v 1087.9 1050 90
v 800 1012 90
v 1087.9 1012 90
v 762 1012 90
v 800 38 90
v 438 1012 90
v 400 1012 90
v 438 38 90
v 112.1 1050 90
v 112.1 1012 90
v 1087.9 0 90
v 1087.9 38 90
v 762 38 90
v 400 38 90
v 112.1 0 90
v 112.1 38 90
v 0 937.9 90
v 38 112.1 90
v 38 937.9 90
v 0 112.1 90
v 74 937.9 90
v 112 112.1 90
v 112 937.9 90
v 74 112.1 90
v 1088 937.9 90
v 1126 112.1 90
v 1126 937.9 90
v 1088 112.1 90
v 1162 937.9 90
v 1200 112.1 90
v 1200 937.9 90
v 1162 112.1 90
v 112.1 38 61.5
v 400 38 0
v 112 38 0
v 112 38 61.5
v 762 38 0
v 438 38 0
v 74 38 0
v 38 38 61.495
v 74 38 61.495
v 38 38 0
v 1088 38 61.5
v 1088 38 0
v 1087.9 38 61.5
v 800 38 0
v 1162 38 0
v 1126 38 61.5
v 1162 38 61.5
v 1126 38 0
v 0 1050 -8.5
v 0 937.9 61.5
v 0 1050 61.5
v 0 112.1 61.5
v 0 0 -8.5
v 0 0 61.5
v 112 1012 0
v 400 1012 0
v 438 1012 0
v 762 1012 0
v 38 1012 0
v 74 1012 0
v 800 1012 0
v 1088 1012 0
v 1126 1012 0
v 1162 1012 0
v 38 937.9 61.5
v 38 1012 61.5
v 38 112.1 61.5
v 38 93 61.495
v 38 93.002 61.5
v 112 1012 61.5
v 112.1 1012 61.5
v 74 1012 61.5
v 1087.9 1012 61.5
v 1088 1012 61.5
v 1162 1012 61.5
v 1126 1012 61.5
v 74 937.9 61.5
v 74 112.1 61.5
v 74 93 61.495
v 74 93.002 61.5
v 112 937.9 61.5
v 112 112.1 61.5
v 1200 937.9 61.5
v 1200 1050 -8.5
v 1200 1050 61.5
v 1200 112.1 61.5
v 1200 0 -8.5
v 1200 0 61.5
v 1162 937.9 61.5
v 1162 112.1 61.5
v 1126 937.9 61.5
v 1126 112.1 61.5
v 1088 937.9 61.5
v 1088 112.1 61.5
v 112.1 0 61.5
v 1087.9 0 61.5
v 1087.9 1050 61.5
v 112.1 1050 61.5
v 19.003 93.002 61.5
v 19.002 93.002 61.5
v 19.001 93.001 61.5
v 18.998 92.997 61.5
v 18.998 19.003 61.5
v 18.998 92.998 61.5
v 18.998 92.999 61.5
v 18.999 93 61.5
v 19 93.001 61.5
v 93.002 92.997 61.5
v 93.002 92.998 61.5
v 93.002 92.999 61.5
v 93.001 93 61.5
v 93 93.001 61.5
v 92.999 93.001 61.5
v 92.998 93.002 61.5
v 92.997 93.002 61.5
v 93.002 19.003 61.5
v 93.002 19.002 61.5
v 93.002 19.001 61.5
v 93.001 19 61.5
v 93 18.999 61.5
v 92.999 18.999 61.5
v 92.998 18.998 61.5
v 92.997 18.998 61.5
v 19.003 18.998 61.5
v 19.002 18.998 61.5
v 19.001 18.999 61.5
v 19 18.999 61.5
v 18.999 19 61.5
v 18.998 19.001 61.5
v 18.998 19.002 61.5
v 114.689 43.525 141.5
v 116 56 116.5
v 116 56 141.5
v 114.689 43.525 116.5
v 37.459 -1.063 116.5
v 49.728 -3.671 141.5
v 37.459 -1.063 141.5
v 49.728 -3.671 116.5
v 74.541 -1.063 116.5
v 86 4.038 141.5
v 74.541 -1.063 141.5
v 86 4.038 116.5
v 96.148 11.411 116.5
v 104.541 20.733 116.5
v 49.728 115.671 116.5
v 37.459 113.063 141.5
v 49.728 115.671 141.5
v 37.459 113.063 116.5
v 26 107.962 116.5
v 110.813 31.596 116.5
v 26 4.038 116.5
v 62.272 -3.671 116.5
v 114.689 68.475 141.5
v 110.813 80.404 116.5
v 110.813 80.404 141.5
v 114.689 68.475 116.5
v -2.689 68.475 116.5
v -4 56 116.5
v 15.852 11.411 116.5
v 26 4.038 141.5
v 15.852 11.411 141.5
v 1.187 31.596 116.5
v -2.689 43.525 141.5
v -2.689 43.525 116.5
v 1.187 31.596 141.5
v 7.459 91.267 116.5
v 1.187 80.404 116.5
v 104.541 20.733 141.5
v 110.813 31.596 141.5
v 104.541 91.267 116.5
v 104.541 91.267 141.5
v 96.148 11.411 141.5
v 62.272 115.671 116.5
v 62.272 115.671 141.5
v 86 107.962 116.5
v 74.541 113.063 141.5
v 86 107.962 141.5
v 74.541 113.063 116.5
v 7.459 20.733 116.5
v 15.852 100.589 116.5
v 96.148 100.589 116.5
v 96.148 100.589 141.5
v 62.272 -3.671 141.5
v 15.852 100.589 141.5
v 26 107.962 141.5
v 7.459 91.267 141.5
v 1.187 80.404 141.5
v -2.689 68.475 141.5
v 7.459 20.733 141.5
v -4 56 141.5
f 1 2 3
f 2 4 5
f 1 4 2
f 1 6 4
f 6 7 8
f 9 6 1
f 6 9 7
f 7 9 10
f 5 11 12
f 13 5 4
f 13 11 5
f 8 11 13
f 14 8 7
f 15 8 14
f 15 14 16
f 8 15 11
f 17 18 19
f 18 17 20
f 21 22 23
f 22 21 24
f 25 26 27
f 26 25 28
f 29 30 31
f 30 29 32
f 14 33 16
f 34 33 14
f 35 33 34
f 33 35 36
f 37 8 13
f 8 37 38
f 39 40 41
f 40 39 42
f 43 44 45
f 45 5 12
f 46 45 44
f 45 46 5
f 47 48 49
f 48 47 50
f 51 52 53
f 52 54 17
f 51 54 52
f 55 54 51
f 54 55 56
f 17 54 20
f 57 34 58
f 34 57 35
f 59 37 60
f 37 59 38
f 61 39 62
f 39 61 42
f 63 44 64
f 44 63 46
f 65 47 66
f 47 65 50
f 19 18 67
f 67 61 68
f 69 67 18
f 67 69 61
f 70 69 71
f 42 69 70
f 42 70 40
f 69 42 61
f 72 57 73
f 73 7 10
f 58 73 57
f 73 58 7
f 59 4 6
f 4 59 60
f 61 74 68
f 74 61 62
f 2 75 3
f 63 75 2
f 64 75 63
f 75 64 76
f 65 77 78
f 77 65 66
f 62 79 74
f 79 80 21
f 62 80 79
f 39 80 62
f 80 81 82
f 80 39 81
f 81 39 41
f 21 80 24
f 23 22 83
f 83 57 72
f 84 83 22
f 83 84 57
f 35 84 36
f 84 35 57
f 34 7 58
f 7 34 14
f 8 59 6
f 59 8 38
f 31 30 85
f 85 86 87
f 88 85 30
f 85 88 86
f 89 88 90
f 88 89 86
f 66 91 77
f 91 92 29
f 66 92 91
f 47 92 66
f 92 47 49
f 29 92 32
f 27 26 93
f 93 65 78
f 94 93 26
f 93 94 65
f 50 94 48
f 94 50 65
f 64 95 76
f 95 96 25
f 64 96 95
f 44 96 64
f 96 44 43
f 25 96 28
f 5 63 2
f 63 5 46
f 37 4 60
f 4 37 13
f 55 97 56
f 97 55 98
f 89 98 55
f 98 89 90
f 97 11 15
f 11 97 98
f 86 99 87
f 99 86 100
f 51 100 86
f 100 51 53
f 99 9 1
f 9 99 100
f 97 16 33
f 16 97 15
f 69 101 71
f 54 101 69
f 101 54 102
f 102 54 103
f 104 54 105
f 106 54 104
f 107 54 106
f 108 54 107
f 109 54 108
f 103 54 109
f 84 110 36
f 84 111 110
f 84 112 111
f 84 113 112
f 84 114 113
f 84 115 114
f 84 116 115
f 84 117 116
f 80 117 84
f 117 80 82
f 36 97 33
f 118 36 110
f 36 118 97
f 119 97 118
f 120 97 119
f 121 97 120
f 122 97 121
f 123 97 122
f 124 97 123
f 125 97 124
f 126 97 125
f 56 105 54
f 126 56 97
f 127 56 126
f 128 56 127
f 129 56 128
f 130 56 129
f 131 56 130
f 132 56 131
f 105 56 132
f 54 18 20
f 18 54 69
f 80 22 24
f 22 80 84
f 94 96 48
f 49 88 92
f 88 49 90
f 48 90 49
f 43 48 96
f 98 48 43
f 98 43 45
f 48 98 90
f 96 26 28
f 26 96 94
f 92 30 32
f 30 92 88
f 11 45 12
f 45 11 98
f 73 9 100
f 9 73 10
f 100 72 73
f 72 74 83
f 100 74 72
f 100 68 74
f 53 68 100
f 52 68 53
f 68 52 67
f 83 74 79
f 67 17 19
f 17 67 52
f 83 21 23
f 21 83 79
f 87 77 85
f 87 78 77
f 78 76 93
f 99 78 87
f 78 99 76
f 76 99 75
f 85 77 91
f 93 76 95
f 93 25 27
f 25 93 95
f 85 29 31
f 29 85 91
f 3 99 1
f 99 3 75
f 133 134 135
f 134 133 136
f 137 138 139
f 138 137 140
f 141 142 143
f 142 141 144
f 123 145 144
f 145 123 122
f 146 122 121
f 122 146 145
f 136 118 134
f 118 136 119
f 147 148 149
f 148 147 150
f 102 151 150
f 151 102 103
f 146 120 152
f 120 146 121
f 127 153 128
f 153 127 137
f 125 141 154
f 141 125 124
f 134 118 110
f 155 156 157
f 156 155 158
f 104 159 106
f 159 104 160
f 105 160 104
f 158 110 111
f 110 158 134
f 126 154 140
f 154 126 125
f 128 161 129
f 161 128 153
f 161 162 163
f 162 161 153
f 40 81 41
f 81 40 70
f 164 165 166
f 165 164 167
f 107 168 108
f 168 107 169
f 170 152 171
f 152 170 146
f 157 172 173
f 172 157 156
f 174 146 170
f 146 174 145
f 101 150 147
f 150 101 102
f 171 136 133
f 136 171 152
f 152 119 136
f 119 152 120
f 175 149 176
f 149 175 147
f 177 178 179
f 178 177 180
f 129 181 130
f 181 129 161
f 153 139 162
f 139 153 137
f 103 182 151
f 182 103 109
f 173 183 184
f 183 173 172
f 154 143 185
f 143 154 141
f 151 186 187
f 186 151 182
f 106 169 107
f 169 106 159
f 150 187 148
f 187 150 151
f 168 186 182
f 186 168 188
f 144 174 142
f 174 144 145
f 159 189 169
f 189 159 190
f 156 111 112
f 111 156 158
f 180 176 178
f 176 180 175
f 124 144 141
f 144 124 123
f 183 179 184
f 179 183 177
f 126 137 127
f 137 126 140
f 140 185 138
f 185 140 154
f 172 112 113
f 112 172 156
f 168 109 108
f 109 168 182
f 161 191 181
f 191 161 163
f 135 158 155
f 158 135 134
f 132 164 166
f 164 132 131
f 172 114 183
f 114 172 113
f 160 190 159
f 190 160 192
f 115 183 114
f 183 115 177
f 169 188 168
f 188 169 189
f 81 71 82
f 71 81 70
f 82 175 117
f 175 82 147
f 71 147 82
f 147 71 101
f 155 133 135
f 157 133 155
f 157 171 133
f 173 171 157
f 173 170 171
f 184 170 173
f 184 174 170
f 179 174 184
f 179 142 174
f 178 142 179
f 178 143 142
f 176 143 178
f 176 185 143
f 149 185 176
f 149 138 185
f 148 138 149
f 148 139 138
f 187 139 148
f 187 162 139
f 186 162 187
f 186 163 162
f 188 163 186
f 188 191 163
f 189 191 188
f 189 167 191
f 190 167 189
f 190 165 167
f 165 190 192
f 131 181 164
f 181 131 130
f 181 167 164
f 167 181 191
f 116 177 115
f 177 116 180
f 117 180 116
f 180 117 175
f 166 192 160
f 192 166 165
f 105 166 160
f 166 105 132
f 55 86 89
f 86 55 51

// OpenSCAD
one=19;
two=38;
four=90;

pad=0.1;
zero=0.01;

// from amazon listing:
// 41.3 x 47.2 x 74.8 inches 
in=25.4;
// packing wood with sauna
base_wood=8.5;

base_x=1200;
base_y=1050;

max_height=150;

wheelbase=74;
wheel_diameter=120;
wheel_height=80;
wheel_bump=25;

wood_flat_height=max_height-base_wood-wheel_height;
wheel_offset=wheelbase/2+two/2;
wood_flat_wide=wheelbase+two+pad*2;

module wheel() {
    hull() {
        translate([0,0,wheel_height-wheel_bump])
        cylinder(d=wheel_diameter,h=wheel_bump);
        cube([wheelbase,wheelbase,zero],center=true);
    }
}

translate([wheel_offset,wheel_offset,max_height-base_wood-wheel_height])
wheel();

module twobyfour(length) {
    cube([length,two,four]);
}

translate([0,0,-base_wood]){
    color("tan")
    linear_extrude(height=base_wood)
    square([base_x,base_y]);
    //#cube([base_x,base_y,max_height]);
}

module dirror_y(y=0) {
    children();
    translate([0,y])
    mirror([0,1])
    children();
}


module dirror_x(x=0) {
    children();
    translate([x,0])
    mirror([1,0])
    children();
}

//#cube([base_x,base_y,max_height]);


module beam_x(y=0) {
    color("lime")
    translate([0,y])
    twobyfour(base_x);
}

module beam_y(x=0) {
    color("blue")
    translate([x+two,two])
    rotate([0,0,90])
    twobyfour(base_y-two*2);
}

module beams() {
    beam_x();
    beam_x(base_y-two);
    dirror_x(base_x) {
        beam_y();
        beam_y(wheelbase);
        beam_y(base_x/3);
    }
}


difference() {
    beams();
    dirror_y(base_y)
    dirror_x(base_x)
    translate([-pad,-pad,max_height-base_wood-wheel_height])
    cube([wood_flat_wide,wood_flat_wide,wheel_height]);
}

echo("CUTSHEET=================================================");
echo("Base sheet ", base_x, "x", base_y, ", ", base_wood, " thick");
echo("6x 2x4", base_y-two*2, "long");
echo("4x of above with", wood_flat_wide-two, "wide flat");
echo("2x 2x4", base_x, "long with", wood_flat_wide, "wide flat");
echo("Flat is", wood_flat_height, "thick");
echo("=========================================================");
